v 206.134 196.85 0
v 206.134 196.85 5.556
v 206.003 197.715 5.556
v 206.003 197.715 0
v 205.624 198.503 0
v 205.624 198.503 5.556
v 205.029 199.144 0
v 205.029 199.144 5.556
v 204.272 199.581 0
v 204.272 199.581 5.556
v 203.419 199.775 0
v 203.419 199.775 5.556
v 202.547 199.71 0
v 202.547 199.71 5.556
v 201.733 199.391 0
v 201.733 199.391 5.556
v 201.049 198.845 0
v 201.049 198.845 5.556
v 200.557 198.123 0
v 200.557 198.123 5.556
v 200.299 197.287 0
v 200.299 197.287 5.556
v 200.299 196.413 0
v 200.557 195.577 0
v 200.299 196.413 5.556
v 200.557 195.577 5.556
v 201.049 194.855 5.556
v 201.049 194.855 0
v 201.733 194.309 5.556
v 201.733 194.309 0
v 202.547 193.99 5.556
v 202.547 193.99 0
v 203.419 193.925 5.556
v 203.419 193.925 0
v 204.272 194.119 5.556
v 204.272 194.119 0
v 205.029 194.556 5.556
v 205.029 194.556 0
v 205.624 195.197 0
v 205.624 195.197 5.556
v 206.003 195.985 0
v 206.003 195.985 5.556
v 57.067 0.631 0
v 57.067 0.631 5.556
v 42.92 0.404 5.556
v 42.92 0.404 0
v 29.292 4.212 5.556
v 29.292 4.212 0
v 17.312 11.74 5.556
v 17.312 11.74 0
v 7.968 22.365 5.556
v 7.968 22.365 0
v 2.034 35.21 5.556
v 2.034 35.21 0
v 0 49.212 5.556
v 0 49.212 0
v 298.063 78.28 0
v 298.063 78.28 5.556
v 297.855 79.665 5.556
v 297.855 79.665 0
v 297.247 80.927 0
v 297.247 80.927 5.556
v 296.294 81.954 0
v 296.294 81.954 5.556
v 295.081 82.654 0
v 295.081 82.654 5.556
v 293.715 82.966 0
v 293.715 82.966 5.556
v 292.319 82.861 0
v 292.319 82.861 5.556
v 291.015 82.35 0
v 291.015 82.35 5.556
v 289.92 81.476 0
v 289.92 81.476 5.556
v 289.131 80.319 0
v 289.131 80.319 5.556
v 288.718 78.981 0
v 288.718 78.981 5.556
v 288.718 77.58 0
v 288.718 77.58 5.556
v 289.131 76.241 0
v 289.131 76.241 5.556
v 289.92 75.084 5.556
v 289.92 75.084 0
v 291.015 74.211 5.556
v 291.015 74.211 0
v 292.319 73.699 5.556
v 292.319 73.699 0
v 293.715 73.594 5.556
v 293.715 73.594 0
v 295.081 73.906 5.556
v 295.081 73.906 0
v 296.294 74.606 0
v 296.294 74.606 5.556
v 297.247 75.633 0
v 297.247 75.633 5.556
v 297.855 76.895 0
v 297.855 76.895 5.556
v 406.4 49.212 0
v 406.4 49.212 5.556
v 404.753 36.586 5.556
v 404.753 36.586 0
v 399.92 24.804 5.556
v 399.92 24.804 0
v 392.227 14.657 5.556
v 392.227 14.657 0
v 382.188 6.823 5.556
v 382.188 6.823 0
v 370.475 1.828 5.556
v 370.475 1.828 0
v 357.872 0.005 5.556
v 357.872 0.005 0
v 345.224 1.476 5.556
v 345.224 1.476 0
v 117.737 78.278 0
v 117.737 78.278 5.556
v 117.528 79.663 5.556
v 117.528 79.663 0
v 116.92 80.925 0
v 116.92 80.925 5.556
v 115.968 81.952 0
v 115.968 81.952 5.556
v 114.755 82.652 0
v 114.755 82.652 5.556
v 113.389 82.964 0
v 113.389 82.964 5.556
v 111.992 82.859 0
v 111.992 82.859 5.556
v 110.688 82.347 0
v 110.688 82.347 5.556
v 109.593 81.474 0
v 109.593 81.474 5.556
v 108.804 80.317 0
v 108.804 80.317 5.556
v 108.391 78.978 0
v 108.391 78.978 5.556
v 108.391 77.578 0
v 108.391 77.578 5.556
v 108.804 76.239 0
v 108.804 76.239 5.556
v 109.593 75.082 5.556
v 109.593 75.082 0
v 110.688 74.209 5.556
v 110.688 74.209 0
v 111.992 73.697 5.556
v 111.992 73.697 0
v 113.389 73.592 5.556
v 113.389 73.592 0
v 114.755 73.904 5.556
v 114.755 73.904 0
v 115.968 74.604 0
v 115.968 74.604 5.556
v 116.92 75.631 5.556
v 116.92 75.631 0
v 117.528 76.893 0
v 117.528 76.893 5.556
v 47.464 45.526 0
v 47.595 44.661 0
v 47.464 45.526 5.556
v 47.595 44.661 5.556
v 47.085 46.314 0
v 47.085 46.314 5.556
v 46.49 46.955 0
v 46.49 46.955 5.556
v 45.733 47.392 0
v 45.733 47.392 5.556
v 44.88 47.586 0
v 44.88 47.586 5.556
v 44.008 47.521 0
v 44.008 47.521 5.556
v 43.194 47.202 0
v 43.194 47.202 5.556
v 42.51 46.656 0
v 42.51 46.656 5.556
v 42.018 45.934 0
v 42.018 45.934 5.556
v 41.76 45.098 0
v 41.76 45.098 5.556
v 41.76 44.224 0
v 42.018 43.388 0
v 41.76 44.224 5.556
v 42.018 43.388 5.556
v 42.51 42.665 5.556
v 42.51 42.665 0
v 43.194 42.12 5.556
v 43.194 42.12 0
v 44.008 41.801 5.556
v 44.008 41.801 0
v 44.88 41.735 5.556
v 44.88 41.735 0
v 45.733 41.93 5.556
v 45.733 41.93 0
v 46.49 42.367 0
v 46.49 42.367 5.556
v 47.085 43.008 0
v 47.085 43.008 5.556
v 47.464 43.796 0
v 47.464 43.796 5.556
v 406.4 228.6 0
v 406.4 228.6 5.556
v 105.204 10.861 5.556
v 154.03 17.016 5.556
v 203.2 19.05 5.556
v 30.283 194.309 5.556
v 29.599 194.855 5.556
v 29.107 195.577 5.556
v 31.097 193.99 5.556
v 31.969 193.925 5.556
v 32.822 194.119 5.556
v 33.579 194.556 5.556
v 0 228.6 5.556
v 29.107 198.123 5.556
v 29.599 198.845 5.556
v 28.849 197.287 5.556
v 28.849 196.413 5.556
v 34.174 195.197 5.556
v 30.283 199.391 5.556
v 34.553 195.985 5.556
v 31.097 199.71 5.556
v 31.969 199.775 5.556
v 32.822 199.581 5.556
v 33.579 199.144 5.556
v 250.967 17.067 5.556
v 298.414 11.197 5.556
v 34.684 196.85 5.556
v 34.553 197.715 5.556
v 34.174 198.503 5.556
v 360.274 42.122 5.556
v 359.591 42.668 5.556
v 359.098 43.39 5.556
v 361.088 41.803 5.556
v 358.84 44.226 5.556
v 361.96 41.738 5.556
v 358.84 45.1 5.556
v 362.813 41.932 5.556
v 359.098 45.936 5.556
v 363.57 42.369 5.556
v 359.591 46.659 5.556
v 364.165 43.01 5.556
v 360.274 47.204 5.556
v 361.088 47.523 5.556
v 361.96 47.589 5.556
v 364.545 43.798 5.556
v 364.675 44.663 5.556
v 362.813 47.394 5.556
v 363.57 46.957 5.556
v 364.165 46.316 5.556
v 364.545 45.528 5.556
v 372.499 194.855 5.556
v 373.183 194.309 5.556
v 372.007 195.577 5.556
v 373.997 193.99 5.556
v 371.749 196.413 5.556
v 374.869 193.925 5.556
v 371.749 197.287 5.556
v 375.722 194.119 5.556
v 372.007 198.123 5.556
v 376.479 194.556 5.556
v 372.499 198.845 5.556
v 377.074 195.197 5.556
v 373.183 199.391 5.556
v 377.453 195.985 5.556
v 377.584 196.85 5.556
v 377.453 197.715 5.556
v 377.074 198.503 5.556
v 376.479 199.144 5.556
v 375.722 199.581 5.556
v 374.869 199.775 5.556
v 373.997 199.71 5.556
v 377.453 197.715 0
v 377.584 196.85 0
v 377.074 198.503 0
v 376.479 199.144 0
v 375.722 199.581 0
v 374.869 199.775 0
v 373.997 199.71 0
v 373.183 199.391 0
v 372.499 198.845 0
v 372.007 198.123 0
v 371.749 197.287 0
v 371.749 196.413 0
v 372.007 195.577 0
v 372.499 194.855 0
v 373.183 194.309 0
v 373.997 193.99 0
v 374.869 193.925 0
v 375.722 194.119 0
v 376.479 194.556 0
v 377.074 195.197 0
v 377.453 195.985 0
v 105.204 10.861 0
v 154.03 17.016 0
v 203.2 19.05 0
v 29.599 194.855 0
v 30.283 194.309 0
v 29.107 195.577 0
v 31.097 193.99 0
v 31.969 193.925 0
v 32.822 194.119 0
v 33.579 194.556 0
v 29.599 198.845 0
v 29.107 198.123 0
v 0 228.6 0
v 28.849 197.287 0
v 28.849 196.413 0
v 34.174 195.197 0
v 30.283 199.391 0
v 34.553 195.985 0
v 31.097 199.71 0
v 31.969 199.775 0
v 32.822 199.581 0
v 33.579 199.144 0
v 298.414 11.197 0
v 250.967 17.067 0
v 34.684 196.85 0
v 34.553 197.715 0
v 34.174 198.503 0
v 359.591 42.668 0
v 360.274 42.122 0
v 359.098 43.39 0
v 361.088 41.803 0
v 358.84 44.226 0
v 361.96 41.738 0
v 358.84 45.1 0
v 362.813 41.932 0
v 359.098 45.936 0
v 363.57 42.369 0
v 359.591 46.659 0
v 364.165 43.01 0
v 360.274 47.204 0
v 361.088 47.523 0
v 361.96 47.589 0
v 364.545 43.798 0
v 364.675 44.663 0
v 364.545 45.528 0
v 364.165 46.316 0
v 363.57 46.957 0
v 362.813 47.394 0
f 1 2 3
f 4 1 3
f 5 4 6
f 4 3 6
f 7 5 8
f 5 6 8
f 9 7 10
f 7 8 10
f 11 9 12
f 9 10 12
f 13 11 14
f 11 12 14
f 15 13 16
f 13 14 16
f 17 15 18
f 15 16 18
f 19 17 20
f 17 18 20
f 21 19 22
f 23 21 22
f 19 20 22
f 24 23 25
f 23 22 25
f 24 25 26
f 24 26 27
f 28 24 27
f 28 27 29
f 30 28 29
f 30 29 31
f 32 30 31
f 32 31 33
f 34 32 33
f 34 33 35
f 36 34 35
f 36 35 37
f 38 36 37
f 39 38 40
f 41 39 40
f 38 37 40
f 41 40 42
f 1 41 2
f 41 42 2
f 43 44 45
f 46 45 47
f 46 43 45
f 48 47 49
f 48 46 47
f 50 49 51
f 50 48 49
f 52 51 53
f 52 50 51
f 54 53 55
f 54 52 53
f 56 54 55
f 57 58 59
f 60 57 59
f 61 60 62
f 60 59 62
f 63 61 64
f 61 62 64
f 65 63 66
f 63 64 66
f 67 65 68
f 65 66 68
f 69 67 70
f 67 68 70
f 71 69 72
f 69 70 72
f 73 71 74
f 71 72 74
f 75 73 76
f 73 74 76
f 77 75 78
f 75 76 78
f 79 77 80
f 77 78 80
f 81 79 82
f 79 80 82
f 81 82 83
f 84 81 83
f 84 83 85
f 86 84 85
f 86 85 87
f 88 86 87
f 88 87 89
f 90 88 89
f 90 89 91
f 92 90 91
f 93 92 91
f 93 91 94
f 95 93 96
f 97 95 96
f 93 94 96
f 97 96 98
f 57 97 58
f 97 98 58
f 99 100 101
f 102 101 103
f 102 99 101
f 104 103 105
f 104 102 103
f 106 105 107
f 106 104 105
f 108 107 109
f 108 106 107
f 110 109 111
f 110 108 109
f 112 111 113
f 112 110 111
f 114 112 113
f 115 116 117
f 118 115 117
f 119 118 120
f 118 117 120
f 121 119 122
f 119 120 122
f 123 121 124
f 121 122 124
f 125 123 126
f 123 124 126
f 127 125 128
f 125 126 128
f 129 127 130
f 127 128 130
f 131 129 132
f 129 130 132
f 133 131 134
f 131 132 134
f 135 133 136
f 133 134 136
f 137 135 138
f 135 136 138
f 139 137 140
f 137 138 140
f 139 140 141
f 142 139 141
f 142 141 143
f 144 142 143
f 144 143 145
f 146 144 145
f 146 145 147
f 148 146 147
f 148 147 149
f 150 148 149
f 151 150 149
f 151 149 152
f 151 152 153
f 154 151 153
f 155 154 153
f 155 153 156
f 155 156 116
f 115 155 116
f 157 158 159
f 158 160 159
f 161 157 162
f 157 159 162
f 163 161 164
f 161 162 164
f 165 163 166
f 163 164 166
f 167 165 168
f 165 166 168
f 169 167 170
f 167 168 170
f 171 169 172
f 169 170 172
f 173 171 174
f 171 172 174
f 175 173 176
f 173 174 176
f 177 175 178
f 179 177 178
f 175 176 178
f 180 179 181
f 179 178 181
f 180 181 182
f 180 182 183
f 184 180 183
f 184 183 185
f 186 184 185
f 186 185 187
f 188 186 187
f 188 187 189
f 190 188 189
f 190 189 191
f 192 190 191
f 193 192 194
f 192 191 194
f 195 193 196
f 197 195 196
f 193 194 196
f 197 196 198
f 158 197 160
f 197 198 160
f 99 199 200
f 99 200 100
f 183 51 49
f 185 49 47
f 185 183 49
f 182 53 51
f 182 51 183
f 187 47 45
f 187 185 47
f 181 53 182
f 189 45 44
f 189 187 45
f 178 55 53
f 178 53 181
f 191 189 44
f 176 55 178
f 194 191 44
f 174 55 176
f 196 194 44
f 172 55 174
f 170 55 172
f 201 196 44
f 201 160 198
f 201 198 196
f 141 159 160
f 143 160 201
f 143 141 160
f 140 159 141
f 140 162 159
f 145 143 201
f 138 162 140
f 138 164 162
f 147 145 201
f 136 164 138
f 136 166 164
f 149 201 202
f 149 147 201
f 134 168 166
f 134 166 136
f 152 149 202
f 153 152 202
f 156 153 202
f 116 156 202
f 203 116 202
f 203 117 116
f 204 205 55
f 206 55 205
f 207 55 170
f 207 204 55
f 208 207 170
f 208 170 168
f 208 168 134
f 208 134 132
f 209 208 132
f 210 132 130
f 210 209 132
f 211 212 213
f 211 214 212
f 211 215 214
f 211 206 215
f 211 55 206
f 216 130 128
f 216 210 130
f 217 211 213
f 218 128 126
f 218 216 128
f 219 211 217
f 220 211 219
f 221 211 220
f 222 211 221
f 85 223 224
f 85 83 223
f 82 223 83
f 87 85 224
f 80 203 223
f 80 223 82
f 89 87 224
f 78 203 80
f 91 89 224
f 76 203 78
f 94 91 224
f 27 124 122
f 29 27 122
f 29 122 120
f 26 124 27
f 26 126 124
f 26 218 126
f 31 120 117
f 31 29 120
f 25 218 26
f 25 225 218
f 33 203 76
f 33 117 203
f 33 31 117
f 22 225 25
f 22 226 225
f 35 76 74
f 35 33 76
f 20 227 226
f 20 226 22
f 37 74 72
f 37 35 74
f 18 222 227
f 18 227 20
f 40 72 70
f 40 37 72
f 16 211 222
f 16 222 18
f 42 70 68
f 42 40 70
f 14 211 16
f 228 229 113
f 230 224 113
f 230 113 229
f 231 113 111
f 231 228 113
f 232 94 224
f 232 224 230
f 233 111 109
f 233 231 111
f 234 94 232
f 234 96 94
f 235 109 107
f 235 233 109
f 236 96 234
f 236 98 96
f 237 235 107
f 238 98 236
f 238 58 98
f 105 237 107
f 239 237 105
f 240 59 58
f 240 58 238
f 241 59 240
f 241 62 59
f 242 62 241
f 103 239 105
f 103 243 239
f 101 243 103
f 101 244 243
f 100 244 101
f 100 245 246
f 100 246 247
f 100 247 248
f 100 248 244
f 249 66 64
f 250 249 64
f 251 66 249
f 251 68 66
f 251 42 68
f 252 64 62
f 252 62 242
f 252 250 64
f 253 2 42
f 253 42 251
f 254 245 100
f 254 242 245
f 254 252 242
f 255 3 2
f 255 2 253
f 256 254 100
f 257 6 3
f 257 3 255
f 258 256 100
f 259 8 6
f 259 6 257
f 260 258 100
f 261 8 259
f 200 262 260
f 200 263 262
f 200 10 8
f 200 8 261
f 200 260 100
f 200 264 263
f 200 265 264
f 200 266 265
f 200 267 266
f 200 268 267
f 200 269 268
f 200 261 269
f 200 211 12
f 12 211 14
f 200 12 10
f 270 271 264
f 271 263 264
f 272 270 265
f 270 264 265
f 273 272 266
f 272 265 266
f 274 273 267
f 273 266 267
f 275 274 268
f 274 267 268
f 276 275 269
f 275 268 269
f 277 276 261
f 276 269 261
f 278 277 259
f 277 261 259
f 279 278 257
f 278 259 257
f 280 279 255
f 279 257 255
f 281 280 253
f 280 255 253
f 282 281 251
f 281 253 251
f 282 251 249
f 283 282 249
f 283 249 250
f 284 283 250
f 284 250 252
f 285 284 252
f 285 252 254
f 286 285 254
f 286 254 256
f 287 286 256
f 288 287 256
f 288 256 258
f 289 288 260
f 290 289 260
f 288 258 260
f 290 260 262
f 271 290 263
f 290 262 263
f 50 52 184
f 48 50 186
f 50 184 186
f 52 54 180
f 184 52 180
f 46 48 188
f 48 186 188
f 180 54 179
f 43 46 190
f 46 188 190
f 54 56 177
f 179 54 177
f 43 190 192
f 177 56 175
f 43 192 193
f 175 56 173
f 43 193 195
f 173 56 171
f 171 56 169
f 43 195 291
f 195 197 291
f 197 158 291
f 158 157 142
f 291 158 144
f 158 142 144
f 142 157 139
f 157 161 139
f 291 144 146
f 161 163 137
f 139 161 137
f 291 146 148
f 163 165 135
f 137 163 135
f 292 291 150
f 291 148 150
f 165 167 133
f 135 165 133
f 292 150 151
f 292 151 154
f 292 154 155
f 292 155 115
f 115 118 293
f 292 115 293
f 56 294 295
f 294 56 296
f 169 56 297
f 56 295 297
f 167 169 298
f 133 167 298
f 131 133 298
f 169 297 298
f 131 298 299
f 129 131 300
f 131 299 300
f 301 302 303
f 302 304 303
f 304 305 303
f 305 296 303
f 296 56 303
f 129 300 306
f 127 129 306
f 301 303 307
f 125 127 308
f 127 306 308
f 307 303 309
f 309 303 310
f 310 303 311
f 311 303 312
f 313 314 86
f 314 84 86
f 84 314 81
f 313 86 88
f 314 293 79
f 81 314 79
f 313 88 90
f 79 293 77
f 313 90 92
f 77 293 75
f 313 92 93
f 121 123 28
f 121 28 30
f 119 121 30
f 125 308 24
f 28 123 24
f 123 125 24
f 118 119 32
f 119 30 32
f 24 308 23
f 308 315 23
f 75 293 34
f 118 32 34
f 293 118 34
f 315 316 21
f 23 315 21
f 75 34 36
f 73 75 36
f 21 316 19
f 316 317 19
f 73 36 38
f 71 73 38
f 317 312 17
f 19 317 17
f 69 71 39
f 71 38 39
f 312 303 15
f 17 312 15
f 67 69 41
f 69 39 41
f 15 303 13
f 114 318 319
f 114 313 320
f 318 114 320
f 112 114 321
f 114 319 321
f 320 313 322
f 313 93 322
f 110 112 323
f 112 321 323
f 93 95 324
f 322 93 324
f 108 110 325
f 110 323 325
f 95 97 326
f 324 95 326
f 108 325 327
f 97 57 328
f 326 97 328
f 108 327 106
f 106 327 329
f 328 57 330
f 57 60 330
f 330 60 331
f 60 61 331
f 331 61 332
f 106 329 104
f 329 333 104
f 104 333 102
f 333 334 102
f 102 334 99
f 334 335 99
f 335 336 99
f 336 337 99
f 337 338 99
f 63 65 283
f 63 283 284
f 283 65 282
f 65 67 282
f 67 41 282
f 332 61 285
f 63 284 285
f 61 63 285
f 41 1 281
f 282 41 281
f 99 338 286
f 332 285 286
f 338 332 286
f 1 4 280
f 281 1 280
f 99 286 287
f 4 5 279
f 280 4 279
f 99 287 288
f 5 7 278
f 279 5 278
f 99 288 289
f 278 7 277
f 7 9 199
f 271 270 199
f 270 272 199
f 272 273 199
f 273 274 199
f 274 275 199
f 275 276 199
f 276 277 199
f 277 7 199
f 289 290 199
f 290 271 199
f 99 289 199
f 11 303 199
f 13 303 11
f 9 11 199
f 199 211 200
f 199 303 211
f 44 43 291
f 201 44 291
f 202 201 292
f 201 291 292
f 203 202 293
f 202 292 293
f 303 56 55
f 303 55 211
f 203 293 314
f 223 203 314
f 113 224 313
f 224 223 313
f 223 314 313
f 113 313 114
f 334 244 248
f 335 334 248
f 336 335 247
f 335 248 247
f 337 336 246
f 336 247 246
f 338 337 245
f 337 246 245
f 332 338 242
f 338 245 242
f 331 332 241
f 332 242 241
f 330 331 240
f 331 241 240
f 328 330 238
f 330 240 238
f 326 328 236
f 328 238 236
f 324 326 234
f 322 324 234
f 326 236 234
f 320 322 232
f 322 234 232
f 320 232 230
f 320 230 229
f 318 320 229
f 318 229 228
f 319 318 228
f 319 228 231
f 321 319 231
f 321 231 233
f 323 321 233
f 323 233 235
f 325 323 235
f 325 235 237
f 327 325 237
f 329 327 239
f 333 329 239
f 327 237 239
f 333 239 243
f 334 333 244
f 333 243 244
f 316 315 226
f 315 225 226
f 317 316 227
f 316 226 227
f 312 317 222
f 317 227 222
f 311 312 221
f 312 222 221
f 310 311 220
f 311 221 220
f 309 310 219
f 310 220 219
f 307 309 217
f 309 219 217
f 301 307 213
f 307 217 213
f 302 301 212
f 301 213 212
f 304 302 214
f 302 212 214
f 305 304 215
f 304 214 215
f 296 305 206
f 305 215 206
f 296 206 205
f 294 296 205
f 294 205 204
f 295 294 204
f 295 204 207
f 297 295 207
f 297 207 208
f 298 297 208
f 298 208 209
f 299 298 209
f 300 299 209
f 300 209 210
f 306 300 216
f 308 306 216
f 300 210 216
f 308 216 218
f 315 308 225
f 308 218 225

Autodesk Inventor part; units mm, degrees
ref_plane "YZ Plane" through (0, 0, 0) normal (1, 0, 0) x (0, 1, 0)
ref_plane "XZ Plane" through (0, 0, 0) normal (0, 1, 0) x (-1, 0, 0)
ref_plane "XY Plane" through (0, 0, 0) normal (0, 0, 1) x (1, 0, 0)
sketch "Sketch1" plane through (0, 0, 0) normal (0, 0, 1) x (1, 0, 0)
  line L0 (49.2125, 0) -> (54.6328, 0)
  line L1 (357.1875, 0) -> (350.9902, 0)
  arc A0 (0, 49.2125) -> (65.0875, 2.6308) centre (49.2125, 49.2125) ccw
  arc A1 (345.2239, 1.4763) -> (406.4, 49.2125) centre (357.1875, 49.2125) ccw
  arc A2 (203.2, 19.05) -> (54.6328, 0) centre (202.8115, -566.7686) ccw
  arc A3 (350.9902, 0) -> (345.2239, 1.4763) centre (202.8115, -566.7686) ccw
  arc A4 (65.0875, 2.6308) -> (54.6328, 0) centre (202.8115, -566.7686) ccw
  arc A5 (350.9902, 0) -> (203.2, 19.05) centre (202.8115, -566.7686) ccw
  line L2 (0, 49.2125) -> (0, 228.6)
  line L3 (406.4, 228.6) -> (406.4, 49.2125)
  line L4 (0, 228.6) -> (406.4, 228.6)
  point P0 (0, 0)
  point P1 (57.0671, 0.6309)
extrude "Extrusion1" add sketch "Sketch1" along normal blind 5.5563 contours A0 L2 L4 L3 A1 A5 A2
sketch "Sketch2" plane through (0, 0, 5.5563) normal (0, 0, 1) x (1, 0, 0)
  arc A0 (0, 49.2125) -> (57.0671, 0.6309) centre (49.2125, 49.2125) ccw projected
  arc A1 (345.2239, 1.4763) -> (406.4, 49.2125) centre (357.1875, 49.2125) ccw projected
  line L0 (361.7622, 0.2131) -> (361.7412, 44.6631)
  line L1 (361.7412, 44.6631) -> (406.1912, 44.6631)
  line L2 (0.2109, 44.6609) -> (44.6609, 44.6609)
  line L3 (44.6609, 44.6609) -> (44.6609, 0.2109)
  line L4 (365.2681, 38.3131) -> (368.9342, 44.6631)
  line L5 (365.2681, 51.0131) -> (368.9342, 44.6631)
  line L6 (357.9357, 51.0131) -> (365.2681, 51.0131)
  line L7 (357.9357, 38.3131) -> (365.2681, 38.3131)
  line L8 (357.9357, 51.0131) -> (354.2695, 44.6631)
  line L9 (354.2695, 44.6631) -> (357.9357, 38.3131)
  line L10 (48.1878, 38.3109) -> (51.854, 44.6609)
  line L11 (48.1878, 51.0109) -> (51.854, 44.6609)
  line L12 (40.8554, 51.0109) -> (48.1878, 51.0109)
  line L13 (40.8554, 38.3109) -> (48.1878, 38.3109)
  line L14 (40.8554, 51.0109) -> (37.1893, 44.6609)
  line L15 (37.1893, 44.6609) -> (40.8554, 38.3109)
  circle A2 centre (361.7412, 44.6631) radius 2.9337
  circle A3 centre (44.6609, 44.6609) radius 2.9337
  point P0 (0, 0)
  dimension "d97" = 44.45
  dimension "d99" = 44.45
  dimension "d100" = 44.45
  dimension "d101" = 44.45
  dimension "d102" = 12.7
  dimension "d103" = 12.7
  dimension "d104" = 12.7
  dimension "d105" = 7.3323
  dimension "d106" = 7.3323
  dimension "d107" = 7.3323
  dimension "d108" = 7.3323
  dimension "d109" = 7.3323
  dimension "d110" = 7.3323
  dimension "d111" = 12.7
  dimension "d112" = 12.7
  dimension "d113" = 12.7
  dimension "d114" = 7.3323
  dimension "d115" = 7.3323
  dimension "d116" = 7.3323
  dimension "d117" = 7.3323
  dimension "d118" = 7.3323
  dimension "d119" = 7.3323
  dimension "d145" = 5.8674
  dimension "d156" = 5.8674
extrude "Extrusion2" cut sketch "Sketch2" against normal through all contours A3 L3 L2 | L2 L3 A3 | A2 L1 L0 | L0 L1 A2
sketch "Sketch5" plane through (-0.198, 12.7962, 5.5563) normal (0, 0, 1) x (1, 0, 0)
  circle A0 centre (31.948, 184.0538) radius 2.9337
  circle A1 centre (374.848, 184.0538) radius 2.9337
  line L0 (31.948, 184.0538) -> (203.398, 184.0538)
  circle A2 centre (203.398, 184.0538) radius 2.9337
  point P0 (0.198, 215.8038)
  dimension "d141" = 5.8674
  dimension "d140" = 5.8674
  dimension "d139" = 171.45
  dimension "d138" = 5.8674
extrude "Extrusion6" cut sketch "Sketch5" against normal up to surface (5.5563 mm away)
sketch "Sketch6" plane through (0, 0, 5.5563) normal (0, 0, 1) x (1, 0, 0)
  ellipse E0 centre (293.3334, 94.2801) end of major axis (293.3295, 96.2801) minor radius 2
  ellipse E1 centre (293.3643, 62.2802) end of major axis (293.3569, 64.2802) minor radius 2
  circle A0 centre (361.7412, 44.6631) radius 2.9337 projected
  line L0 (361.7412, 44.6631) -> (293.3643, 44.6631)
  line L1 (293.3643, 44.6631) -> (293.3643, 62.2802)
  ellipse E2 centre (113.007, 94.278) end of major axis (113.0032, 96.278) minor radius 2
  ellipse E3 centre (113.0379, 62.2781) end of major axis (113.0305, 64.2781) minor radius 2
  line L2 (113.0379, 44.6609) -> (113.0379, 62.2781)
  circle A1 centre (293.3643, 78.2802) radius 4.699
  circle A2 centre (113.0379, 78.278) radius 4.699
  circle A3 centre (44.6609, 44.6609) radius 2.9337 projected
  line L3 (44.6609, 44.6609) -> (113.0379, 44.6609)
  point P0 (0, 0)
  dimension "d147" = 17.6171
  dimension "d148" = 68.3769
  dimension "d150" = 17.6171
  dimension "d152" = 9.398
  dimension "d153" = 9.398
  dimension "d157" = 68.3769
extrude "Extrusion7" cut sketch "Sketch6" against normal through all contours A1 | A2
properties part number "FTC Outside Panels" material "Wood (Oak)"
